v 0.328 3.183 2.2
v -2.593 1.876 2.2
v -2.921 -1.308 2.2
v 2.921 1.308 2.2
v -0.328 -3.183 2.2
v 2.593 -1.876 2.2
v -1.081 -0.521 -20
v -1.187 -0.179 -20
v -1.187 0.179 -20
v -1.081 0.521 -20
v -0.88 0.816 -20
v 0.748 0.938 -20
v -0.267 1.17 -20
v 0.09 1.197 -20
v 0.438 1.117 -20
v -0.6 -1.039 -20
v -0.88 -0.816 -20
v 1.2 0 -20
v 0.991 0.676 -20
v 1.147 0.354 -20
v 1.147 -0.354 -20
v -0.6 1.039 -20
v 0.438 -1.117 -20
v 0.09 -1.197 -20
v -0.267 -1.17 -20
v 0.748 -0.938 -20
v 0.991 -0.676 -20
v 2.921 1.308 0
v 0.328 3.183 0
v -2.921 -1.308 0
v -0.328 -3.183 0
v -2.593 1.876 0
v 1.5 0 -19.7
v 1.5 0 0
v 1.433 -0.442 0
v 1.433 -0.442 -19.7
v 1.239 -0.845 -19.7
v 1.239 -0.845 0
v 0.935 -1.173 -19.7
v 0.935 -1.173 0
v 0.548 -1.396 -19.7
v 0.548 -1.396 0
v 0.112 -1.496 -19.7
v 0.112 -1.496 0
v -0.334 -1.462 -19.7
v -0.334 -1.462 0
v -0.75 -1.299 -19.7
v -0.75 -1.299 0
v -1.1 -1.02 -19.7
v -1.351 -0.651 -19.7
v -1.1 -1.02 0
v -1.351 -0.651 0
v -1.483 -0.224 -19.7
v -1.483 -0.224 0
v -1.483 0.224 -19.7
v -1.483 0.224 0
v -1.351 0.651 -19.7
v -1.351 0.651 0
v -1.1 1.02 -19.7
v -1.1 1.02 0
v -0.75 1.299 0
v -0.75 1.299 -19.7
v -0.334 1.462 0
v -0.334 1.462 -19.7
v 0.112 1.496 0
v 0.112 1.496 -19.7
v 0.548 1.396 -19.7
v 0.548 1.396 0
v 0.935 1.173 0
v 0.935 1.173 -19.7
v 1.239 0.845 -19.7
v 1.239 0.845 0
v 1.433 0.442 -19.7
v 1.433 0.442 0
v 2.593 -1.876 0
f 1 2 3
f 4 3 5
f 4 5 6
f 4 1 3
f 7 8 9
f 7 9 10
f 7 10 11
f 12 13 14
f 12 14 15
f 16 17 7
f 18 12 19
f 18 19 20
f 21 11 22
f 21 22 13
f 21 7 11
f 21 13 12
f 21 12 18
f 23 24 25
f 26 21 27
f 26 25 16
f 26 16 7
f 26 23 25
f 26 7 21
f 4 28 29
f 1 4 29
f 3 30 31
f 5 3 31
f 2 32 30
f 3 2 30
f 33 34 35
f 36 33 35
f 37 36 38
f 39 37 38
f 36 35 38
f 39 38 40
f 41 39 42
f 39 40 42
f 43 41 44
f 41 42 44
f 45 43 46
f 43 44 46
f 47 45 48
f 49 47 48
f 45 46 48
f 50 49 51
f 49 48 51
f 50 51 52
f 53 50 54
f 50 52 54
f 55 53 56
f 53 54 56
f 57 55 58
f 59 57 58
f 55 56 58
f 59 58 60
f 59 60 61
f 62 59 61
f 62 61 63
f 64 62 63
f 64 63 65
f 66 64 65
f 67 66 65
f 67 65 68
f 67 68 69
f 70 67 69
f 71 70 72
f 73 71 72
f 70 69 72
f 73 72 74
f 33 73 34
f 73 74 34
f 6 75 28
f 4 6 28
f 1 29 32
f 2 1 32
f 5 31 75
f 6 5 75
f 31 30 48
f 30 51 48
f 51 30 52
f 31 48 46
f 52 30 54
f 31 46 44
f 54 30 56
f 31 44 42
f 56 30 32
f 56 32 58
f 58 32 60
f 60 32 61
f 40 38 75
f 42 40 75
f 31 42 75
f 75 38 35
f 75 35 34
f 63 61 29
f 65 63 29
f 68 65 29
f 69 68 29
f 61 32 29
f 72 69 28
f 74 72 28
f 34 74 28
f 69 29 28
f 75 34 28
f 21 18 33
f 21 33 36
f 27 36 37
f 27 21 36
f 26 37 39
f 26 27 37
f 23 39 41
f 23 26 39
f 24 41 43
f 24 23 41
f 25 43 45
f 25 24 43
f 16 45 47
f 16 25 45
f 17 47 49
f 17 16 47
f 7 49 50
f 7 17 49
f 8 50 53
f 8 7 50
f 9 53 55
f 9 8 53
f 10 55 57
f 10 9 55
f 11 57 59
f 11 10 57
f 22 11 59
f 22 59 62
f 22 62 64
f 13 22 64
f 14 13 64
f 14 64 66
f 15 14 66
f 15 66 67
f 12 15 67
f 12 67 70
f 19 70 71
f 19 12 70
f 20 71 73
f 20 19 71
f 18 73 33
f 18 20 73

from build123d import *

# Parameters (mm, degrees)
BOSS_EXTRUDE1_DEPTH = 2.2
SKETCH2_R           = 1.5
BOSS_EXTRUDE2_DEPTH = 20
CHAMFER1_SIZE       = 0.3


with BuildPart() as part:
    # Sketch1 → Boss-Extrude1 (new body)
    with BuildSketch(Plane.XY):
        Polygon((2.592758174, -1.87552794), (2.920633928, 1.307630474), (0.327875755, 3.183158414), (-2.592758174, 1.87552794), (-2.920633928, -1.307630474), (-0.327875755, -3.183158414), align=None)
    extrude(amount=BOSS_EXTRUDE1_DEPTH)

    # Sketch2 → Boss-Extrude2 (add)
    with BuildSketch(Plane(origin=(0, 0, 0), x_dir=(-1, 0, 0), z_dir=(0, 0, -1))):
        with Locations(Location((0, 0, 0), (0, 0, 180))):
            Circle(SKETCH2_R)
    extrude(amount=BOSS_EXTRUDE2_DEPTH)

    # Chamfer1
    chamfer1_edges = [part.edges().sort_by_distance(p)[0] for p in [
        (-1.5, 0, -20),
    ]]
    chamfer(chamfer1_edges, length=CHAMFER1_SIZE)


solid = part.part
